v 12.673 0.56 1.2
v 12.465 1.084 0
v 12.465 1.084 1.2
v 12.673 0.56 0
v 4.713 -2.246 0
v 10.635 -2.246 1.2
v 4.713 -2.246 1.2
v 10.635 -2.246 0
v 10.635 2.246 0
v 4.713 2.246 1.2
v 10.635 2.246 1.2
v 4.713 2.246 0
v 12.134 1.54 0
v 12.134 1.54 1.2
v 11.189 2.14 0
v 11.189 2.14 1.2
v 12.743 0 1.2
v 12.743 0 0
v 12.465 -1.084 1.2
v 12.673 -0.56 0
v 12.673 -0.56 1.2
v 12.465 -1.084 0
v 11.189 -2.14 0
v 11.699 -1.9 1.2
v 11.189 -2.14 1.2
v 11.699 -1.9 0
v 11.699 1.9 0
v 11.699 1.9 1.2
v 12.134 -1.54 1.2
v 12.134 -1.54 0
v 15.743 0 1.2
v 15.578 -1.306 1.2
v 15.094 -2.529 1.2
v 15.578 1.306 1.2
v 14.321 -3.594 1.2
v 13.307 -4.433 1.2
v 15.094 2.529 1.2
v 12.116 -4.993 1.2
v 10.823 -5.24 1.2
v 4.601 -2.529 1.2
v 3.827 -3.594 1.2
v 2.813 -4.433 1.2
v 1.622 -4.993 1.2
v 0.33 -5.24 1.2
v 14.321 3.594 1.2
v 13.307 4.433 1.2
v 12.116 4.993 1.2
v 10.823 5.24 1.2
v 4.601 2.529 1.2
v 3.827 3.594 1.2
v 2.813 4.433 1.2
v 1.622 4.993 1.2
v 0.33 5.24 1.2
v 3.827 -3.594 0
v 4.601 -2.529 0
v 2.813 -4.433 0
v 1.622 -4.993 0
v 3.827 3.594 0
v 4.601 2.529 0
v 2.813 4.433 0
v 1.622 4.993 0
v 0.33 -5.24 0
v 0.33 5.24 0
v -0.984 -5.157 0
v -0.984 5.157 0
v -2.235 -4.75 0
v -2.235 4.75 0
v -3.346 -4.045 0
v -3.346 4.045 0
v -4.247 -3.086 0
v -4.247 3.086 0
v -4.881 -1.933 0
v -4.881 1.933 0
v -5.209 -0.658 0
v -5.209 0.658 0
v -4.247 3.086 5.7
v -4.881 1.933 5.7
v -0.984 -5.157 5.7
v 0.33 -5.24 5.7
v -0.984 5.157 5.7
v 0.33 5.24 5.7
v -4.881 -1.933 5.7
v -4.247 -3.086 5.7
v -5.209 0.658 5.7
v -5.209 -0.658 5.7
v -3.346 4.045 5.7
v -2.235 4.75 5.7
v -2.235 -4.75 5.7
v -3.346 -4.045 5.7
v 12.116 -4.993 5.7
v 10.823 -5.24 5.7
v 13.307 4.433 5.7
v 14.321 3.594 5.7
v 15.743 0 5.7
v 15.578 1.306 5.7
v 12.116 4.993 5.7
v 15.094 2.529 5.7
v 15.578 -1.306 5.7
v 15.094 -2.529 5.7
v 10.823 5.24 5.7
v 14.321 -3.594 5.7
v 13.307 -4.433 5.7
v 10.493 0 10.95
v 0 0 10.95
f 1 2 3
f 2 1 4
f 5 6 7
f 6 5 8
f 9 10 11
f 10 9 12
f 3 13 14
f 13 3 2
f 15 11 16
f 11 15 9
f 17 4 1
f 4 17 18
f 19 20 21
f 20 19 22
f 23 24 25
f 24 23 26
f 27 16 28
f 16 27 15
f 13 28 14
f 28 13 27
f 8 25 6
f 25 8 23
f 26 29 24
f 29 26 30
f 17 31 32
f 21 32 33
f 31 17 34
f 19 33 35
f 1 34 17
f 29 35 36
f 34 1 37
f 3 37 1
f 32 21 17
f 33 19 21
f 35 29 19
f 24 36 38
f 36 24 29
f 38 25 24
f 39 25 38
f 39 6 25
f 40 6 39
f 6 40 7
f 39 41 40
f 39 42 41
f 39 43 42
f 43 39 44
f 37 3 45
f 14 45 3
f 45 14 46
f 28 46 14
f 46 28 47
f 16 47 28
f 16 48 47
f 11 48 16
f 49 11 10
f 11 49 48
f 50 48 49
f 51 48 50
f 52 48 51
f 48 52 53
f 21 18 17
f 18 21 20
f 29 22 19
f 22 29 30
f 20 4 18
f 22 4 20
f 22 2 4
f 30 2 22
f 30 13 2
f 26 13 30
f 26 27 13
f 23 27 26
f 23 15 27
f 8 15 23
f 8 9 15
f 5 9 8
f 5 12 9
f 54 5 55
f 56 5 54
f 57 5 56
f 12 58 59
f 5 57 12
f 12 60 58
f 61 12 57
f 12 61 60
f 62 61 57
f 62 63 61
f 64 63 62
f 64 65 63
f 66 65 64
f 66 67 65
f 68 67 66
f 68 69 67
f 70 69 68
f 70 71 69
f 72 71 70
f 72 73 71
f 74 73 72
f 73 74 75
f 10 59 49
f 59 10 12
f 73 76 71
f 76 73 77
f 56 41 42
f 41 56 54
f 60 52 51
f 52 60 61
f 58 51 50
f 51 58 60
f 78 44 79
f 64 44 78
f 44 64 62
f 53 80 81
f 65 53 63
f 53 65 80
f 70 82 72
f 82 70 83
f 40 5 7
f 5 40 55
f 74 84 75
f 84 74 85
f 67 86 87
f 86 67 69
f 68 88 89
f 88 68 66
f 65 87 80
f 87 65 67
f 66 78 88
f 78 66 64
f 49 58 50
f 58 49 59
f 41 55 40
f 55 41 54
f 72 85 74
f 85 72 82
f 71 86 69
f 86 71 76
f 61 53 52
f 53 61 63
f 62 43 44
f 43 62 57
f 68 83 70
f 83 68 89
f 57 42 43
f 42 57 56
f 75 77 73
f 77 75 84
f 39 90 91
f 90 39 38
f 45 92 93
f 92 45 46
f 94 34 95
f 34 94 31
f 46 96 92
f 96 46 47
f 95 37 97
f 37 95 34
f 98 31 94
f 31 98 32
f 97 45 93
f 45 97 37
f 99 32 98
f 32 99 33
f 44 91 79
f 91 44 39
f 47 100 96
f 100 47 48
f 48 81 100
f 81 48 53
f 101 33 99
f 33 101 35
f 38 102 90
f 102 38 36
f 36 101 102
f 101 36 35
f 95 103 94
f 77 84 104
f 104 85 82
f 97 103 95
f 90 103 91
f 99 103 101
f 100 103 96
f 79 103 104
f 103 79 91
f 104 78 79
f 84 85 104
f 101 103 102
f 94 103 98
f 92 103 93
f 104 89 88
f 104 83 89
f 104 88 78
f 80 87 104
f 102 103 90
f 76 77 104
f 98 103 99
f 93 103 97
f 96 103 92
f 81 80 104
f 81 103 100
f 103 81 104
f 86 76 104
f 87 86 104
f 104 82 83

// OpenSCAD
// Alexey D. Filimonov <alexey@filimonic.net>
// 2019

/* ChangeLog
    2019-05-23 Added ability to customize diameters
    2019-05-20 First Release
    

*/
/* [Common] */
// Use pre-defined screw cap sizes
use_pre_defined = 0; //[0:No, 1:Yes]

/* [Quality] */
// Quality of the model
quality_fn = 25; // [5:50]
/* [Parameters if you use pre-defined cap sizing] */
// Screw body diameter, mm
screw_body_diameter1 = 3.0;
// Screw cap type (chooose)
screw_hat_type = 1 ;// [1:Machine Countersink, 2:Machine Countersink raised, 3:Machine Panhead, 4:Machine Cheesehead, 5:Hex socket Cap, 6:Hex socket Countersink, 7:Hex bolt]
/* [Parameters if you not use pre-defined cap sizing] */
screw_body_diameter2 = 4.0;
screw_hat_diameter = 10.0;
screw_hat_height = 4.0;


/* [Tolerance] */
// Tolerance when printed, mm
tolerance = 0.5; //[0:0.1:2]
/* [Floor Thickness] */
// Floor thickness, mm, for easy cut
floor_thickness = 1.2; //[0:0.05:2]


/* [Hidden] */

$fn = quality_fn;
// Hat diameter:
hat_diameter_multiplier = [ 
  1.75, // Machine Countersink
  1.75, // Machine Countersink raised
  2.00, // Machine Panhead
  1.60, // Machine Chesshead
  1.50, // Hex socket Cap
  2.00, // Hex socket Countersink
  2.00, // Hex bolt
];

hat_height_multiplier = [ 
  0.50, // Machine Countersink
  0.75, // Machine Countersink raised
  0.60, // Machine Panhead
  0.60, // Machine Chesshead
  1.25, // Hex socket Cap
  0.60, // Hex socket Countersink
  0.70, // Hex bolt
];

function get_hat_diameter(d_body, h_type) = hat_diameter_multiplier[h_type-1] * d_body;
function get_hat_height(d_body, h_type) = hat_height_multiplier[h_type-1] * d_body;
function get_screw_max_slide(d_hat, d_body) = d_hat -(d_hat/2)*(1- cos(asin(d_body/d_hat)));

_bd = (use_pre_defined == 0) ? screw_body_diameter2 + tolerance : screw_body_diameter1 + tolerance ;
_bh = floor_thickness;
_hd = (use_pre_defined == 0) ? screw_hat_diameter + tolerance : get_hat_diameter(_bd, screw_hat_type) + tolerance;
_hh = (use_pre_defined == 0) ? screw_hat_height + tolerance : get_hat_height(_bd, screw_hat_type) + tolerance;
_md = get_screw_max_slide(_hd, _bd) + tolerance;



echo("_bd",_bd);
hull() {
    cylinder (h=_bh, d=_bd);
    translate ([_md,0,0]) cylinder (h=_bh, d=_bd);
}
cylinder(h = _hh + _bh, d = _hd);
hull() {
    translate([0, 0,_bh])  cylinder(h = _hh, d = _hd);
    translate([_md,0,_bh]) cylinder(h = _hh, d = _hd);
}
hull() {
    translate([_md,0,_bh+_hh]) cylinder(h=_hd/2, d1= _hd, d2 = 0);
    translate([0 ,0, _bh+_hh]) cylinder(h=_hd/2, d1= _hd, d2 = 0);
}
